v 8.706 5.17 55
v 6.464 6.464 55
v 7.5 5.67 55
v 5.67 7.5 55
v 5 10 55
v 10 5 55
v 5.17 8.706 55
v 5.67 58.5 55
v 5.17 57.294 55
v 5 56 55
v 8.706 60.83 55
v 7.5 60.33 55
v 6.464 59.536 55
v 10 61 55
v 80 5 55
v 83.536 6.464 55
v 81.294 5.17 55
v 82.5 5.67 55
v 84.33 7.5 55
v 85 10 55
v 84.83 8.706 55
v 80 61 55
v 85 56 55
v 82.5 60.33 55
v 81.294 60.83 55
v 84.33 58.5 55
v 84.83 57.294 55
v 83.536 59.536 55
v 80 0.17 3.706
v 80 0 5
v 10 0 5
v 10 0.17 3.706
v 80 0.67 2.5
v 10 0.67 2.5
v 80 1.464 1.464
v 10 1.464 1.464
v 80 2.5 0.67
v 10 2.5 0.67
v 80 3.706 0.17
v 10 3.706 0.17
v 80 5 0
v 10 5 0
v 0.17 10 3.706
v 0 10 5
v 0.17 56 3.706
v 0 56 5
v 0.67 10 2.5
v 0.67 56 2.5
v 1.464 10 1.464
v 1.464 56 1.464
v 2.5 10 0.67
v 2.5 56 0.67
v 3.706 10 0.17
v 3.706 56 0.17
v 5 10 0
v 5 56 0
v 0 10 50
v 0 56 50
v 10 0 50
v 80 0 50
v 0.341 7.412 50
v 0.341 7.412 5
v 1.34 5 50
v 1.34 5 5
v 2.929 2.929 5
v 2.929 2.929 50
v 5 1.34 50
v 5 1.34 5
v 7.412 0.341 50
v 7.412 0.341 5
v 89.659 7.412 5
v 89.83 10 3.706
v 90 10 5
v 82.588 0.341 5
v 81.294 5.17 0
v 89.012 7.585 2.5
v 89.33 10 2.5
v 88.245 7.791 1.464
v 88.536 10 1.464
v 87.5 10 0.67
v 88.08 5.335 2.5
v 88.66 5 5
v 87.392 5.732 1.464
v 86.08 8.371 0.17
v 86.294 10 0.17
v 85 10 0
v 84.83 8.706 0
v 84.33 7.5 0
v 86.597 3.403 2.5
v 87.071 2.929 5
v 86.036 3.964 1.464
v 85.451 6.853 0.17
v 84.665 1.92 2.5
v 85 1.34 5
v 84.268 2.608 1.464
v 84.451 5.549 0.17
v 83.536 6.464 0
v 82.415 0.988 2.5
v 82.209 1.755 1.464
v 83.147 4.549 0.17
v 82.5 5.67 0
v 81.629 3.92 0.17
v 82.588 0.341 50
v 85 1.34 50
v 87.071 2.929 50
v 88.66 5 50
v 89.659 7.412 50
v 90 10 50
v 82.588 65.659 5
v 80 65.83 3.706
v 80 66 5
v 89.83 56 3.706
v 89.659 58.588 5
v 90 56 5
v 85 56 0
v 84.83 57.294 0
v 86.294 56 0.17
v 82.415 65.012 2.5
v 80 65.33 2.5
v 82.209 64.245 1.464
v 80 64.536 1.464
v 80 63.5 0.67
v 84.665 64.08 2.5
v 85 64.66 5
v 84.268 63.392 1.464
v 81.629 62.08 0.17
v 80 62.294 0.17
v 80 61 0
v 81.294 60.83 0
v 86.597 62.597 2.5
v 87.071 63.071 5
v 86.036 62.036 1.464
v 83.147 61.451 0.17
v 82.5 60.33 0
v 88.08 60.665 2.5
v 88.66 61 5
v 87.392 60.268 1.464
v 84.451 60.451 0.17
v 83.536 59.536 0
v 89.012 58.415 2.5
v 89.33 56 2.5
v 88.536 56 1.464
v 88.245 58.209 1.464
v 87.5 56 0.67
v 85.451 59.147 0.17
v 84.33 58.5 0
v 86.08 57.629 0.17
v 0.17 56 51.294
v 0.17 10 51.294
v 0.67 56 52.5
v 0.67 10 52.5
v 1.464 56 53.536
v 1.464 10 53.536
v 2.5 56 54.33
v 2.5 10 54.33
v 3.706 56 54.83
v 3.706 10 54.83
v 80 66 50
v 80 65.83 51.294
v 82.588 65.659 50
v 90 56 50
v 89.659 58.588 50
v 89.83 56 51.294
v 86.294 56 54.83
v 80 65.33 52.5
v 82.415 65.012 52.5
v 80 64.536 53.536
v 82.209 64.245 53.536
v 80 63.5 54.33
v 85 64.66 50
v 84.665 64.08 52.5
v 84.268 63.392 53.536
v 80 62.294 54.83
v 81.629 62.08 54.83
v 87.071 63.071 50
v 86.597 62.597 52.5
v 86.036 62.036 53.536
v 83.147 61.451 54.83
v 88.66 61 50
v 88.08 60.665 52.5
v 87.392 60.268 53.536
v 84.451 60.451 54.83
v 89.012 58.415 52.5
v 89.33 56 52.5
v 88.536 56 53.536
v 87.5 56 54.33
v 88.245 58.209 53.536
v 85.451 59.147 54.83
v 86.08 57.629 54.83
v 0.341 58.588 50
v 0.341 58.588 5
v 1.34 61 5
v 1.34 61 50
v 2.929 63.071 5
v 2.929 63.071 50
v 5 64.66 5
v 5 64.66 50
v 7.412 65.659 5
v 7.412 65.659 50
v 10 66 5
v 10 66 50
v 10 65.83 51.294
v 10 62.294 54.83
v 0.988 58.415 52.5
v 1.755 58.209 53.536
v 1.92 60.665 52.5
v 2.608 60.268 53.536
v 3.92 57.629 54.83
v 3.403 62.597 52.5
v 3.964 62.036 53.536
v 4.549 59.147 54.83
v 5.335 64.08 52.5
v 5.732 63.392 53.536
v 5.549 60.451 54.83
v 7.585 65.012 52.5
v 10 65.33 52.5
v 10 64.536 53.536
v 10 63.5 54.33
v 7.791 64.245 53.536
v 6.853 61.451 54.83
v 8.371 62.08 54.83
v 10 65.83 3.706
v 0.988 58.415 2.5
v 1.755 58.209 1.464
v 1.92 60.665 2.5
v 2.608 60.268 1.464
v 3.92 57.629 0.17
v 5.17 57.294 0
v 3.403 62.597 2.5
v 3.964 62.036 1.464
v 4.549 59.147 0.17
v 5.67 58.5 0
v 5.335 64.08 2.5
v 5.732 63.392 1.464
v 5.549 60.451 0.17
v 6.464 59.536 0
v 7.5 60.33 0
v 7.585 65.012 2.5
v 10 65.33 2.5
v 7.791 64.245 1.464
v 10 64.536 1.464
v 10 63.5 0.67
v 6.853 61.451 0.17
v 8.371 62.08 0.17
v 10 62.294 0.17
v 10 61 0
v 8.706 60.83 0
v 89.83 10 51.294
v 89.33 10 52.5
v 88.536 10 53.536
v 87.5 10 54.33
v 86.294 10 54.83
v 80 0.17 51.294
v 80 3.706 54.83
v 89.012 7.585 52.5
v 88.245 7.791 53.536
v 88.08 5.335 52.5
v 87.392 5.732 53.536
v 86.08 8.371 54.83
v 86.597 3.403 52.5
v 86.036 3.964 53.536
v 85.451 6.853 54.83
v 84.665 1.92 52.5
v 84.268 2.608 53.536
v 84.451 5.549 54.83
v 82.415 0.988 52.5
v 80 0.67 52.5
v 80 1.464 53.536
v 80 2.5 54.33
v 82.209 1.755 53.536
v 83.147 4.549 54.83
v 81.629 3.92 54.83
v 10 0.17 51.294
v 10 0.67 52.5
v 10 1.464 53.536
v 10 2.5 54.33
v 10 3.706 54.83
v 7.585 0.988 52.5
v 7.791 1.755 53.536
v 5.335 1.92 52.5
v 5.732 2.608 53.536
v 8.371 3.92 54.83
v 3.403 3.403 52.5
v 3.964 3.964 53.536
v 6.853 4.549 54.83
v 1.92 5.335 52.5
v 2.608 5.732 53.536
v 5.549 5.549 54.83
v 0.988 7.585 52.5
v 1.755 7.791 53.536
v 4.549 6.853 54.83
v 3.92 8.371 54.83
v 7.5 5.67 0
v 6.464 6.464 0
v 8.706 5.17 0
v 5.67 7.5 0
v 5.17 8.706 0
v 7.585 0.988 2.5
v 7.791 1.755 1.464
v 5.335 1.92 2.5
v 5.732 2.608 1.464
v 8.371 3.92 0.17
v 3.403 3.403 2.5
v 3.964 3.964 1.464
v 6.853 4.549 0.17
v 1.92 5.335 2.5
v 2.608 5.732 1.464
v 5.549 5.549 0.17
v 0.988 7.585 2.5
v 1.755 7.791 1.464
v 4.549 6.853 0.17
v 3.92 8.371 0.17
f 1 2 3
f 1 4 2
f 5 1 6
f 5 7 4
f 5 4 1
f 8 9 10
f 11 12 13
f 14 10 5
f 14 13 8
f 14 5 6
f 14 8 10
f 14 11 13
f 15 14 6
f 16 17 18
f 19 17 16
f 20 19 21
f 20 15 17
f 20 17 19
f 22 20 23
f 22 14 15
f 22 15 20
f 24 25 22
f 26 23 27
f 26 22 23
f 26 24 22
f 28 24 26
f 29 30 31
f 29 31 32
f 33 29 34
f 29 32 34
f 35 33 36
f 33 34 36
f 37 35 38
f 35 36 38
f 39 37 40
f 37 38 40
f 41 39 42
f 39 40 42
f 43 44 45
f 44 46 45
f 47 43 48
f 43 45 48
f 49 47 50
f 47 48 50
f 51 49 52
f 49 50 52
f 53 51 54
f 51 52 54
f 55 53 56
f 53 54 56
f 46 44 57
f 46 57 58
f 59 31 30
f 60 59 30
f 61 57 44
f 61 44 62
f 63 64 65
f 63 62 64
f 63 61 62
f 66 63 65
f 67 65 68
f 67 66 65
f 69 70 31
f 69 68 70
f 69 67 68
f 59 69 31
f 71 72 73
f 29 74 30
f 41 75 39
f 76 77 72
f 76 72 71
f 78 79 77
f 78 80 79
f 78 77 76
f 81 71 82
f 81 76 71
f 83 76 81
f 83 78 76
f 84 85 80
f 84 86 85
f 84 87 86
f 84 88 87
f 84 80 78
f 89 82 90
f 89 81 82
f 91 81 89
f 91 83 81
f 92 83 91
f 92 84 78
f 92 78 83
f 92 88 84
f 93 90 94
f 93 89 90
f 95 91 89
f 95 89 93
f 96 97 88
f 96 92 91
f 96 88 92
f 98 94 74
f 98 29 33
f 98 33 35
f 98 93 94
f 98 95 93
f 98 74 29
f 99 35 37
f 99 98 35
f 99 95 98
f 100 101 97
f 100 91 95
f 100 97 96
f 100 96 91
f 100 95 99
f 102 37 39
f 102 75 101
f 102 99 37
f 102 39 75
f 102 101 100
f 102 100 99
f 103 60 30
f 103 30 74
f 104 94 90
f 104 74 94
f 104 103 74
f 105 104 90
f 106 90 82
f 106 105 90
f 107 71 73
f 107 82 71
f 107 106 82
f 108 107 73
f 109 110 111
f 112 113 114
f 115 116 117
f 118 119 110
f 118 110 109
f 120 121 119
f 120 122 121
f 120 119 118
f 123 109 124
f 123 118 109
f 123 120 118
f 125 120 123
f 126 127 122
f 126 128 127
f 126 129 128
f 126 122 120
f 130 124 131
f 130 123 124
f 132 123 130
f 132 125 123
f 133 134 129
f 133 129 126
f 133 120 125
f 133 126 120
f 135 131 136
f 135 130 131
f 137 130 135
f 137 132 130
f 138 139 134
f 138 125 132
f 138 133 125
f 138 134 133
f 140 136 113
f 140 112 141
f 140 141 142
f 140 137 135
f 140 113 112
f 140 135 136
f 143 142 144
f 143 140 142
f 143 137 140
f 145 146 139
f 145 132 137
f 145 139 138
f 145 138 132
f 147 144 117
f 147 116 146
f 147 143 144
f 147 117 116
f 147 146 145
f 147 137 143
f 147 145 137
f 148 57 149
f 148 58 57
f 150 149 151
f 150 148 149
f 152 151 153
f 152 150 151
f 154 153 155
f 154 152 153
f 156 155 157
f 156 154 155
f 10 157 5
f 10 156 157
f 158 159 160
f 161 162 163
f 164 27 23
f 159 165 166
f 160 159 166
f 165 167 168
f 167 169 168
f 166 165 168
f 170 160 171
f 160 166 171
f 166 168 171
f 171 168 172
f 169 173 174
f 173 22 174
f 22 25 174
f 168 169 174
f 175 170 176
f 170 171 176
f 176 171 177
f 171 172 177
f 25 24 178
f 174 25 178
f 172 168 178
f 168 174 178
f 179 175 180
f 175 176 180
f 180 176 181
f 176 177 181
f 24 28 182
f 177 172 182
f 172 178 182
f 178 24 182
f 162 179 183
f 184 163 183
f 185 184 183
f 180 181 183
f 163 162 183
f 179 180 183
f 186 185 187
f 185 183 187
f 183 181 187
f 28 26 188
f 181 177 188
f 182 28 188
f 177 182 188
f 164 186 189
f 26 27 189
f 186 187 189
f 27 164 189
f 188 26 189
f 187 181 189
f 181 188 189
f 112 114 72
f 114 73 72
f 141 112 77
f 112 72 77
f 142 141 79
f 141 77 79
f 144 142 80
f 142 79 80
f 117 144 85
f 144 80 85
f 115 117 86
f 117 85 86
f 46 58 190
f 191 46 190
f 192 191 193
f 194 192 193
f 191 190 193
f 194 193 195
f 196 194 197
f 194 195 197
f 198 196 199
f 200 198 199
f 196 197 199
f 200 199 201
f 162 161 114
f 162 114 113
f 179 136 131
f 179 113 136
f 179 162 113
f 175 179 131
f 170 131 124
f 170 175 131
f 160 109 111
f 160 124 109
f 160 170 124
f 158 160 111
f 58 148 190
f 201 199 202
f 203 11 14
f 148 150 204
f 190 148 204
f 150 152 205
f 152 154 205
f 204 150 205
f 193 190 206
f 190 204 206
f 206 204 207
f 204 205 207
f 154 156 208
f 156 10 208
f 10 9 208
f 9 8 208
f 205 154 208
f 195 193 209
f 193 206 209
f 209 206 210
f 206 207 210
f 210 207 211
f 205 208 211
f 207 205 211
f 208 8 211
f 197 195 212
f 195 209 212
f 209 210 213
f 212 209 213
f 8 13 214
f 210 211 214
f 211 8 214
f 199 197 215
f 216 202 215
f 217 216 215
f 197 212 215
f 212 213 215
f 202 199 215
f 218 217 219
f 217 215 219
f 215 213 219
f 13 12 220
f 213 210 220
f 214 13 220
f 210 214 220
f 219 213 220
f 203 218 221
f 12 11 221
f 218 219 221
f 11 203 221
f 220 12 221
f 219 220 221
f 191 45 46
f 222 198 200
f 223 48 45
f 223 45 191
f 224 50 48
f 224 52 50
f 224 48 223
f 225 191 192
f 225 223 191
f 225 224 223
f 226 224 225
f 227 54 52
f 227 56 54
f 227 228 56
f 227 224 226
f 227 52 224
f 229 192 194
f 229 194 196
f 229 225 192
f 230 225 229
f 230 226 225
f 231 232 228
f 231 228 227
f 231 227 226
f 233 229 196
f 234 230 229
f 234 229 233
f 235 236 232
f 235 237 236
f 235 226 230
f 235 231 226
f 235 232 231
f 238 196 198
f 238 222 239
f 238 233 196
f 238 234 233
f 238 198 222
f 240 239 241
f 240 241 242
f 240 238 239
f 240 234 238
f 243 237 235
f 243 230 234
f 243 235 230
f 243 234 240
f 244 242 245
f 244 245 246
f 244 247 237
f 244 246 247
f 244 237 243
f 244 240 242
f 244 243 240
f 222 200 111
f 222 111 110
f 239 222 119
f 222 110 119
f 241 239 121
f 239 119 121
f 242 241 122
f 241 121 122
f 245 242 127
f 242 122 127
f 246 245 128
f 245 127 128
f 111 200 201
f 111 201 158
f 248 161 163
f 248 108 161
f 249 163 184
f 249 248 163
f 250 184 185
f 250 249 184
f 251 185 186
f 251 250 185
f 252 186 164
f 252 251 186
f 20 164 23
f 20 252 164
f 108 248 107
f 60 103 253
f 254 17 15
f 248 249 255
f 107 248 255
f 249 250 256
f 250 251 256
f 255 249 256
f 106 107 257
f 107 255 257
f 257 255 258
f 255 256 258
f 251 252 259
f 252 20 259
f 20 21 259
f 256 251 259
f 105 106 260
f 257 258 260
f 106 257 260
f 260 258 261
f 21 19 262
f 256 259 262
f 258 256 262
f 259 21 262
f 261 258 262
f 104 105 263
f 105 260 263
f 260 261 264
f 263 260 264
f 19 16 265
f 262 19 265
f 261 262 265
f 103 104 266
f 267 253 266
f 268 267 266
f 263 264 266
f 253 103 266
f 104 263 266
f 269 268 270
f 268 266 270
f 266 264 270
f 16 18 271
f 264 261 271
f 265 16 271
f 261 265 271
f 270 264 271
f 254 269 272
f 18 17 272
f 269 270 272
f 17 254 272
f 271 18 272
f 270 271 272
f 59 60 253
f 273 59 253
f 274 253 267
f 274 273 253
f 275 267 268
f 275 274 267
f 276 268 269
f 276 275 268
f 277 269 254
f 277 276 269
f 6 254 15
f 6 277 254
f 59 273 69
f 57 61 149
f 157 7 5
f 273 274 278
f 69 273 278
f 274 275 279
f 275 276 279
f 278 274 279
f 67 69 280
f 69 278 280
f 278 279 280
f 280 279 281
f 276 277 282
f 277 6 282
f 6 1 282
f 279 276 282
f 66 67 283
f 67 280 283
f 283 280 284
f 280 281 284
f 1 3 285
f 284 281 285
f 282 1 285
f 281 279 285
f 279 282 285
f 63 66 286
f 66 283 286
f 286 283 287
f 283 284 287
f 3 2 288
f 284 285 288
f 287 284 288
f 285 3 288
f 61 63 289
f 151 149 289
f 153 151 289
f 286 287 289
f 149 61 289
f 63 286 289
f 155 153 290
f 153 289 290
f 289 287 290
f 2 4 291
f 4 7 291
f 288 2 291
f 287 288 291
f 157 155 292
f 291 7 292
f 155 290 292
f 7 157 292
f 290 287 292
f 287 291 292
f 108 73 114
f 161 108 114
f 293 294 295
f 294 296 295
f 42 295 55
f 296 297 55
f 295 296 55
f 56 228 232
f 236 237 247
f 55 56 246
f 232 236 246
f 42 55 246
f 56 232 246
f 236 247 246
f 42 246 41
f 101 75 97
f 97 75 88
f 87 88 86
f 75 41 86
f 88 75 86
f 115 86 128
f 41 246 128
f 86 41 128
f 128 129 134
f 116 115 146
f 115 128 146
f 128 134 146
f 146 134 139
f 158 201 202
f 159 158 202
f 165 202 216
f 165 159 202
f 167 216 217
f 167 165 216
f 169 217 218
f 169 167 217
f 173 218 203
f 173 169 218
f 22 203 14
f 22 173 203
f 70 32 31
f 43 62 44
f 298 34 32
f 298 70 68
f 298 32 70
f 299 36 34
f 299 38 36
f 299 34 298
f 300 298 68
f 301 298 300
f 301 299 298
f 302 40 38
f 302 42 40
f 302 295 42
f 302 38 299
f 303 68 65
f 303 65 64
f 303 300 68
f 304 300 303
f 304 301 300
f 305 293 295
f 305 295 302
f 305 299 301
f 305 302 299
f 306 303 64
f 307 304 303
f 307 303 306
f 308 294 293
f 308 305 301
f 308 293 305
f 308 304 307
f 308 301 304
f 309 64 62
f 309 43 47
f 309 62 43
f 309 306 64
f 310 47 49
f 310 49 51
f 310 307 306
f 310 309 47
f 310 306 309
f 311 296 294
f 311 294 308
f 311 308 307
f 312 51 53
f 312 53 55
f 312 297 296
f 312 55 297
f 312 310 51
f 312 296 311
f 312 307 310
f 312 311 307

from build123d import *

# Parameters (mm, degrees)
F0_W     = 90
F0_H     = 66
F1_DEPTH = 55
F2_R     = 10
F3_R     = 5


with BuildPart() as f1:
    # F0 (on Top) → F1 (new body)
    with BuildSketch(Plane.XY):
        with Locations((45, 33)):
            Rectangle(F0_W, F0_H)
    extrude(amount=F1_DEPTH)

    # F2
    f2_edges = [f1.edges().sort_by_distance(p)[0] for p in [
        (90, 0, 27.5),
        (90, 66, 27.5),
        (0, 66, 27.5),
        (0, 0, 27.5),
    ]]
    fillet(f2_edges, radius=F2_R)

    # F3
    f3_edges = [f1.edges().sort_by_distance(p)[0] for p in [
        (0, 33, 0),
        (2.928932, 63.071068, 0),
        (2.928932, 2.928932, 0),
        (45, 66, 0),
        (45, 0, 0),
        (87.071068, 63.071068, 0),
        (87.071068, 2.928932, 0),
        (90, 33, 0),
        (0, 33, 55),
        (2.928932, 63.071068, 55),
        (2.928932, 2.928932, 55),
        (45, 66, 55),
        (45, 0, 55),
        (87.071068, 63.071068, 55),
        (87.071068, 2.928932, 55),
        (90, 33, 55),
    ]]
    fillet(f3_edges, radius=F3_R)


solid = f1.part
